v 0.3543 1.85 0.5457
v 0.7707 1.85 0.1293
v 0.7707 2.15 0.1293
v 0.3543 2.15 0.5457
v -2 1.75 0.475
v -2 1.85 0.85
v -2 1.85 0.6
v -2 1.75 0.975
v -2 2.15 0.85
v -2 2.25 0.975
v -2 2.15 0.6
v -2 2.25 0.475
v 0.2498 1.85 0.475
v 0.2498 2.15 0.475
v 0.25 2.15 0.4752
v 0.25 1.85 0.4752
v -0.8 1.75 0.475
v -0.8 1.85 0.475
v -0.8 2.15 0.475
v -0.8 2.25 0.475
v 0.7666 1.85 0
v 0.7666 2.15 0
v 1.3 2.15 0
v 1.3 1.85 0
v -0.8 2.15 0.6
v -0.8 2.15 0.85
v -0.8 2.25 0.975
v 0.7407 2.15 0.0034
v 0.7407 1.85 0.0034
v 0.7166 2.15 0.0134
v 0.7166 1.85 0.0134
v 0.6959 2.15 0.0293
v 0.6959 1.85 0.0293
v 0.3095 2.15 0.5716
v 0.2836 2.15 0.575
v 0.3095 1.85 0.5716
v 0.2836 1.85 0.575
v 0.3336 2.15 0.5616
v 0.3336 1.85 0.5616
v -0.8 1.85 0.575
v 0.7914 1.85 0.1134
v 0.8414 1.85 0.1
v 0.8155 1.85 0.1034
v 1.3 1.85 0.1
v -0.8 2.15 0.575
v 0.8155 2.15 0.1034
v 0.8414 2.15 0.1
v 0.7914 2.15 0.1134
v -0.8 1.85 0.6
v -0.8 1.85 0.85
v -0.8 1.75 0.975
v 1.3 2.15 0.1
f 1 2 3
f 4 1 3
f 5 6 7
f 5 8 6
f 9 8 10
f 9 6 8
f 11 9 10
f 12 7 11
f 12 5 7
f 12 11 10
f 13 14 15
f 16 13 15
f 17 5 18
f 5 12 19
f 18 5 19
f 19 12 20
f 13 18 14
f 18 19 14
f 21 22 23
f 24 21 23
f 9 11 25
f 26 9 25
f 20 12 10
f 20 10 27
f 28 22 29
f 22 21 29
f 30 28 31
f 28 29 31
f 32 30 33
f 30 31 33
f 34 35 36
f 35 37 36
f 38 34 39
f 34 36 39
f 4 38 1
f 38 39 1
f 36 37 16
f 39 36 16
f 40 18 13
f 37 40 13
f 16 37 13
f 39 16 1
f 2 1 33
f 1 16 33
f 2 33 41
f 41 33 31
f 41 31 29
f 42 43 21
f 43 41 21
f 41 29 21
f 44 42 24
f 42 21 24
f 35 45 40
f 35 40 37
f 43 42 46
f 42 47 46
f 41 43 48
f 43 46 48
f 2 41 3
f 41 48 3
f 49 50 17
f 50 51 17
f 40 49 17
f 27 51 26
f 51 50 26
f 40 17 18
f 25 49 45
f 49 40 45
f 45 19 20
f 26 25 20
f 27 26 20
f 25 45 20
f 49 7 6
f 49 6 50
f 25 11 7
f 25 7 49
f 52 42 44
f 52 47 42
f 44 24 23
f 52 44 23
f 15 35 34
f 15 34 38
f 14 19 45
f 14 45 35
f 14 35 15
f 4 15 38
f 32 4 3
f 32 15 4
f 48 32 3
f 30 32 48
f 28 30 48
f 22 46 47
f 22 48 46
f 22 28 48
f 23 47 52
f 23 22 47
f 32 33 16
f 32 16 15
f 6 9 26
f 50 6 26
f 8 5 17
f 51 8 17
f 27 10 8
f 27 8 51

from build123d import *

# Parameters (mm, degrees)
BOX127_W     = 1.2
BOX127_H     = 0.5
BOX127_DEPTH = 0.5
BOX128_W     = 1.5
BOX128_H     = 0.3
BOX128_DEPTH = 0.1
BOX129_W     = 1.3
BOX129_H     = 0.3
BOX129_DEPTH = 0.575
BOX130_W     = 0.25
BOX130_H     = 0.3
BOX130_DEPTH = 0.475
BOX131_W     = 0.5
BOX131_H     = 0.3
BOX131_DEPTH = 0.5
BOX132_W     = 0.5
BOX132_H     = 0.3
BOX132_DEPTH = 0.75
BOX133_W     = 0.4
BOX133_H     = 0.3
BOX133_DEPTH = 0.75
FILLET018_R  = 0.1
FILLET019_R  = 0.1
BOX134_W     = 1.5
BOX134_H     = 0.3
BOX134_DEPTH = 0.25
FILLET028_R  = 0.1


with BuildPart() as part:
    # Box127 → Box127 (join)
    with BuildSketch(Plane(origin=(-2, 4.25, 0.475), x_dir=(1, 0, 0), z_dir=(0, 0, 1))):
        with Locations((0.6, 0.25)):
            Rectangle(BOX127_W, BOX127_H)
    extrude(amount=BOX127_DEPTH)

    # Box128 → Box128 (join)
    with BuildSketch(Plane(origin=(-0.8, 4.35, 0.475), x_dir=(1, 0, 0), z_dir=(0, 0, 1))):
        with Locations((0.75, 0.15)):
            Rectangle(BOX128_W, BOX128_H)
    extrude(amount=BOX128_DEPTH)

    # Box129 → Box129 (join)
    with BuildSketch(Plane(origin=(0, 4.35, 0), x_dir=(1, 0, 0), z_dir=(0, 0, 1))):
        with Locations((0.65, 0.15)):
            Rectangle(BOX129_W, BOX129_H)
    extrude(amount=BOX129_DEPTH)

    # Box130 → Box130 (cut)
    with BuildSketch(Plane(origin=(0, 4.35, 0), x_dir=(1, 0, 0), z_dir=(0, 0, 1))):
        with Locations((0.125, 0.15)):
            Rectangle(BOX130_W, BOX130_H)
    extrude(amount=BOX130_DEPTH, mode=Mode.SUBTRACT)

    # Box131 → Box131 (cut)
    with BuildSketch(Plane(origin=(0.8, 4.35, 0.1), x_dir=(1, 0, 0), z_dir=(0, 0, 1))):
        with Locations((0.25, 0.15)):
            Rectangle(BOX131_W, BOX131_H)
    extrude(amount=BOX131_DEPTH, mode=Mode.SUBTRACT)

    # Box132 → Box132 (cut)
    with BuildSketch(Plane(origin=(0.8, 4.35, 0.1), x_dir=(0.707107, 0, 0.707107), z_dir=(-0.707107, 0, 0.707107))):
        with Locations((0.25, 0.15)):
            Rectangle(BOX132_W, BOX132_H)
    extrude(amount=BOX132_DEPTH, mode=Mode.SUBTRACT)

    # Box133 → Box133 (cut)
    with BuildSketch(Plane(origin=(0.4975, 4.35, -0.338), x_dir=(0.707107, 0, 0.707107), z_dir=(-0.707107, 0, 0.707107))):
        with Locations((0.2, 0.15)):
            Rectangle(BOX133_W, BOX133_H)
    extrude(amount=BOX133_DEPTH, mode=Mode.SUBTRACT)

    # Fillet018
    fillet018_edges = [part.edges().sort_by_distance(p)[0] for p in [
        (0.325, 4.5, 0.575),
    ]]
    fillet(fillet018_edges, radius=FILLET018_R)

    # Fillet019
    fillet019_edges = [part.edges().sort_by_distance(p)[0] for p in [
        (0.725185, 4.5, 0),
    ]]
    fillet(fillet019_edges, radius=FILLET019_R)

    # Box134 → Box134 (cut)
    with BuildSketch(Plane(origin=(-2, 4.35, 0.6), x_dir=(1, 0, 0), z_dir=(0, 0, 1))):
        with Locations((0.75, 0.15)):
            Rectangle(BOX134_W, BOX134_H)
    extrude(amount=BOX134_DEPTH, mode=Mode.SUBTRACT)

    # Fillet028
    fillet028_edges = [part.edges().sort_by_distance(p)[0] for p in [
        (0.8, 4.5, 0.1),
    ]]
    fillet(fillet028_edges, radius=FILLET028_R)


with BuildPart() as part_1:
    # Body043 placement: moved
    add(part.part.moved(Location((0, -2.5, 0))))


solid = part_1.part
